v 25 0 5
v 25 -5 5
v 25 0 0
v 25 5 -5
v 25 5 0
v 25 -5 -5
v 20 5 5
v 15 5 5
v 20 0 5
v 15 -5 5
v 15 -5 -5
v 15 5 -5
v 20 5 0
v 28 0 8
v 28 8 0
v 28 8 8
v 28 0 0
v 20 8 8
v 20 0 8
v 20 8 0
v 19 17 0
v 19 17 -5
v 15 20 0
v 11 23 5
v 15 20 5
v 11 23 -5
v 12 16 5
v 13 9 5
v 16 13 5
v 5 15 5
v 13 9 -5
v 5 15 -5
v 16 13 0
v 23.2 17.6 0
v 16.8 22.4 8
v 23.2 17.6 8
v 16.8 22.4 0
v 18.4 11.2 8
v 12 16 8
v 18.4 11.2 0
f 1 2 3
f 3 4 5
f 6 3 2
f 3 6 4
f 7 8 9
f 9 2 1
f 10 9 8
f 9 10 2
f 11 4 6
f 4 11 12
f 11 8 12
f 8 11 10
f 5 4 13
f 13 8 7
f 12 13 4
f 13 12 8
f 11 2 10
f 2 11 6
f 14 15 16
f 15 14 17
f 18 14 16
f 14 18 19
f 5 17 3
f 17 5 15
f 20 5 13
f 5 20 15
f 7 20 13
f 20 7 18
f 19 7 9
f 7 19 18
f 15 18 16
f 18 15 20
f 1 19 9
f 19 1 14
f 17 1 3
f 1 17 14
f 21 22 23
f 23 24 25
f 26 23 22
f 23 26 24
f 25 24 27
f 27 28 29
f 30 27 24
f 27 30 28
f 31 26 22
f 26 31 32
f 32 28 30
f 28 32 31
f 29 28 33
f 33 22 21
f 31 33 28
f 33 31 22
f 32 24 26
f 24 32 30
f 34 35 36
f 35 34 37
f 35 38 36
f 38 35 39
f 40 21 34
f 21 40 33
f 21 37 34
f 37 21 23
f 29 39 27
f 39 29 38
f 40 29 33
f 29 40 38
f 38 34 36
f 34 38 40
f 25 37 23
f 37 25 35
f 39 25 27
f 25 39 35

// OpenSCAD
// ### Usage #########################################################
mirror_and_copy([-10, 20, 0]) {
  translate([20, 0, 0]) {
    cube([10, 10, 10], center = true);
    cube(8);
  }
}


// ### Module ########################################################
// dims - normal vector to mirror plane
module mirror_and_copy(dims) {
  // Object
  children();
  // Mirror
  mirror(dims)
  children();
}
